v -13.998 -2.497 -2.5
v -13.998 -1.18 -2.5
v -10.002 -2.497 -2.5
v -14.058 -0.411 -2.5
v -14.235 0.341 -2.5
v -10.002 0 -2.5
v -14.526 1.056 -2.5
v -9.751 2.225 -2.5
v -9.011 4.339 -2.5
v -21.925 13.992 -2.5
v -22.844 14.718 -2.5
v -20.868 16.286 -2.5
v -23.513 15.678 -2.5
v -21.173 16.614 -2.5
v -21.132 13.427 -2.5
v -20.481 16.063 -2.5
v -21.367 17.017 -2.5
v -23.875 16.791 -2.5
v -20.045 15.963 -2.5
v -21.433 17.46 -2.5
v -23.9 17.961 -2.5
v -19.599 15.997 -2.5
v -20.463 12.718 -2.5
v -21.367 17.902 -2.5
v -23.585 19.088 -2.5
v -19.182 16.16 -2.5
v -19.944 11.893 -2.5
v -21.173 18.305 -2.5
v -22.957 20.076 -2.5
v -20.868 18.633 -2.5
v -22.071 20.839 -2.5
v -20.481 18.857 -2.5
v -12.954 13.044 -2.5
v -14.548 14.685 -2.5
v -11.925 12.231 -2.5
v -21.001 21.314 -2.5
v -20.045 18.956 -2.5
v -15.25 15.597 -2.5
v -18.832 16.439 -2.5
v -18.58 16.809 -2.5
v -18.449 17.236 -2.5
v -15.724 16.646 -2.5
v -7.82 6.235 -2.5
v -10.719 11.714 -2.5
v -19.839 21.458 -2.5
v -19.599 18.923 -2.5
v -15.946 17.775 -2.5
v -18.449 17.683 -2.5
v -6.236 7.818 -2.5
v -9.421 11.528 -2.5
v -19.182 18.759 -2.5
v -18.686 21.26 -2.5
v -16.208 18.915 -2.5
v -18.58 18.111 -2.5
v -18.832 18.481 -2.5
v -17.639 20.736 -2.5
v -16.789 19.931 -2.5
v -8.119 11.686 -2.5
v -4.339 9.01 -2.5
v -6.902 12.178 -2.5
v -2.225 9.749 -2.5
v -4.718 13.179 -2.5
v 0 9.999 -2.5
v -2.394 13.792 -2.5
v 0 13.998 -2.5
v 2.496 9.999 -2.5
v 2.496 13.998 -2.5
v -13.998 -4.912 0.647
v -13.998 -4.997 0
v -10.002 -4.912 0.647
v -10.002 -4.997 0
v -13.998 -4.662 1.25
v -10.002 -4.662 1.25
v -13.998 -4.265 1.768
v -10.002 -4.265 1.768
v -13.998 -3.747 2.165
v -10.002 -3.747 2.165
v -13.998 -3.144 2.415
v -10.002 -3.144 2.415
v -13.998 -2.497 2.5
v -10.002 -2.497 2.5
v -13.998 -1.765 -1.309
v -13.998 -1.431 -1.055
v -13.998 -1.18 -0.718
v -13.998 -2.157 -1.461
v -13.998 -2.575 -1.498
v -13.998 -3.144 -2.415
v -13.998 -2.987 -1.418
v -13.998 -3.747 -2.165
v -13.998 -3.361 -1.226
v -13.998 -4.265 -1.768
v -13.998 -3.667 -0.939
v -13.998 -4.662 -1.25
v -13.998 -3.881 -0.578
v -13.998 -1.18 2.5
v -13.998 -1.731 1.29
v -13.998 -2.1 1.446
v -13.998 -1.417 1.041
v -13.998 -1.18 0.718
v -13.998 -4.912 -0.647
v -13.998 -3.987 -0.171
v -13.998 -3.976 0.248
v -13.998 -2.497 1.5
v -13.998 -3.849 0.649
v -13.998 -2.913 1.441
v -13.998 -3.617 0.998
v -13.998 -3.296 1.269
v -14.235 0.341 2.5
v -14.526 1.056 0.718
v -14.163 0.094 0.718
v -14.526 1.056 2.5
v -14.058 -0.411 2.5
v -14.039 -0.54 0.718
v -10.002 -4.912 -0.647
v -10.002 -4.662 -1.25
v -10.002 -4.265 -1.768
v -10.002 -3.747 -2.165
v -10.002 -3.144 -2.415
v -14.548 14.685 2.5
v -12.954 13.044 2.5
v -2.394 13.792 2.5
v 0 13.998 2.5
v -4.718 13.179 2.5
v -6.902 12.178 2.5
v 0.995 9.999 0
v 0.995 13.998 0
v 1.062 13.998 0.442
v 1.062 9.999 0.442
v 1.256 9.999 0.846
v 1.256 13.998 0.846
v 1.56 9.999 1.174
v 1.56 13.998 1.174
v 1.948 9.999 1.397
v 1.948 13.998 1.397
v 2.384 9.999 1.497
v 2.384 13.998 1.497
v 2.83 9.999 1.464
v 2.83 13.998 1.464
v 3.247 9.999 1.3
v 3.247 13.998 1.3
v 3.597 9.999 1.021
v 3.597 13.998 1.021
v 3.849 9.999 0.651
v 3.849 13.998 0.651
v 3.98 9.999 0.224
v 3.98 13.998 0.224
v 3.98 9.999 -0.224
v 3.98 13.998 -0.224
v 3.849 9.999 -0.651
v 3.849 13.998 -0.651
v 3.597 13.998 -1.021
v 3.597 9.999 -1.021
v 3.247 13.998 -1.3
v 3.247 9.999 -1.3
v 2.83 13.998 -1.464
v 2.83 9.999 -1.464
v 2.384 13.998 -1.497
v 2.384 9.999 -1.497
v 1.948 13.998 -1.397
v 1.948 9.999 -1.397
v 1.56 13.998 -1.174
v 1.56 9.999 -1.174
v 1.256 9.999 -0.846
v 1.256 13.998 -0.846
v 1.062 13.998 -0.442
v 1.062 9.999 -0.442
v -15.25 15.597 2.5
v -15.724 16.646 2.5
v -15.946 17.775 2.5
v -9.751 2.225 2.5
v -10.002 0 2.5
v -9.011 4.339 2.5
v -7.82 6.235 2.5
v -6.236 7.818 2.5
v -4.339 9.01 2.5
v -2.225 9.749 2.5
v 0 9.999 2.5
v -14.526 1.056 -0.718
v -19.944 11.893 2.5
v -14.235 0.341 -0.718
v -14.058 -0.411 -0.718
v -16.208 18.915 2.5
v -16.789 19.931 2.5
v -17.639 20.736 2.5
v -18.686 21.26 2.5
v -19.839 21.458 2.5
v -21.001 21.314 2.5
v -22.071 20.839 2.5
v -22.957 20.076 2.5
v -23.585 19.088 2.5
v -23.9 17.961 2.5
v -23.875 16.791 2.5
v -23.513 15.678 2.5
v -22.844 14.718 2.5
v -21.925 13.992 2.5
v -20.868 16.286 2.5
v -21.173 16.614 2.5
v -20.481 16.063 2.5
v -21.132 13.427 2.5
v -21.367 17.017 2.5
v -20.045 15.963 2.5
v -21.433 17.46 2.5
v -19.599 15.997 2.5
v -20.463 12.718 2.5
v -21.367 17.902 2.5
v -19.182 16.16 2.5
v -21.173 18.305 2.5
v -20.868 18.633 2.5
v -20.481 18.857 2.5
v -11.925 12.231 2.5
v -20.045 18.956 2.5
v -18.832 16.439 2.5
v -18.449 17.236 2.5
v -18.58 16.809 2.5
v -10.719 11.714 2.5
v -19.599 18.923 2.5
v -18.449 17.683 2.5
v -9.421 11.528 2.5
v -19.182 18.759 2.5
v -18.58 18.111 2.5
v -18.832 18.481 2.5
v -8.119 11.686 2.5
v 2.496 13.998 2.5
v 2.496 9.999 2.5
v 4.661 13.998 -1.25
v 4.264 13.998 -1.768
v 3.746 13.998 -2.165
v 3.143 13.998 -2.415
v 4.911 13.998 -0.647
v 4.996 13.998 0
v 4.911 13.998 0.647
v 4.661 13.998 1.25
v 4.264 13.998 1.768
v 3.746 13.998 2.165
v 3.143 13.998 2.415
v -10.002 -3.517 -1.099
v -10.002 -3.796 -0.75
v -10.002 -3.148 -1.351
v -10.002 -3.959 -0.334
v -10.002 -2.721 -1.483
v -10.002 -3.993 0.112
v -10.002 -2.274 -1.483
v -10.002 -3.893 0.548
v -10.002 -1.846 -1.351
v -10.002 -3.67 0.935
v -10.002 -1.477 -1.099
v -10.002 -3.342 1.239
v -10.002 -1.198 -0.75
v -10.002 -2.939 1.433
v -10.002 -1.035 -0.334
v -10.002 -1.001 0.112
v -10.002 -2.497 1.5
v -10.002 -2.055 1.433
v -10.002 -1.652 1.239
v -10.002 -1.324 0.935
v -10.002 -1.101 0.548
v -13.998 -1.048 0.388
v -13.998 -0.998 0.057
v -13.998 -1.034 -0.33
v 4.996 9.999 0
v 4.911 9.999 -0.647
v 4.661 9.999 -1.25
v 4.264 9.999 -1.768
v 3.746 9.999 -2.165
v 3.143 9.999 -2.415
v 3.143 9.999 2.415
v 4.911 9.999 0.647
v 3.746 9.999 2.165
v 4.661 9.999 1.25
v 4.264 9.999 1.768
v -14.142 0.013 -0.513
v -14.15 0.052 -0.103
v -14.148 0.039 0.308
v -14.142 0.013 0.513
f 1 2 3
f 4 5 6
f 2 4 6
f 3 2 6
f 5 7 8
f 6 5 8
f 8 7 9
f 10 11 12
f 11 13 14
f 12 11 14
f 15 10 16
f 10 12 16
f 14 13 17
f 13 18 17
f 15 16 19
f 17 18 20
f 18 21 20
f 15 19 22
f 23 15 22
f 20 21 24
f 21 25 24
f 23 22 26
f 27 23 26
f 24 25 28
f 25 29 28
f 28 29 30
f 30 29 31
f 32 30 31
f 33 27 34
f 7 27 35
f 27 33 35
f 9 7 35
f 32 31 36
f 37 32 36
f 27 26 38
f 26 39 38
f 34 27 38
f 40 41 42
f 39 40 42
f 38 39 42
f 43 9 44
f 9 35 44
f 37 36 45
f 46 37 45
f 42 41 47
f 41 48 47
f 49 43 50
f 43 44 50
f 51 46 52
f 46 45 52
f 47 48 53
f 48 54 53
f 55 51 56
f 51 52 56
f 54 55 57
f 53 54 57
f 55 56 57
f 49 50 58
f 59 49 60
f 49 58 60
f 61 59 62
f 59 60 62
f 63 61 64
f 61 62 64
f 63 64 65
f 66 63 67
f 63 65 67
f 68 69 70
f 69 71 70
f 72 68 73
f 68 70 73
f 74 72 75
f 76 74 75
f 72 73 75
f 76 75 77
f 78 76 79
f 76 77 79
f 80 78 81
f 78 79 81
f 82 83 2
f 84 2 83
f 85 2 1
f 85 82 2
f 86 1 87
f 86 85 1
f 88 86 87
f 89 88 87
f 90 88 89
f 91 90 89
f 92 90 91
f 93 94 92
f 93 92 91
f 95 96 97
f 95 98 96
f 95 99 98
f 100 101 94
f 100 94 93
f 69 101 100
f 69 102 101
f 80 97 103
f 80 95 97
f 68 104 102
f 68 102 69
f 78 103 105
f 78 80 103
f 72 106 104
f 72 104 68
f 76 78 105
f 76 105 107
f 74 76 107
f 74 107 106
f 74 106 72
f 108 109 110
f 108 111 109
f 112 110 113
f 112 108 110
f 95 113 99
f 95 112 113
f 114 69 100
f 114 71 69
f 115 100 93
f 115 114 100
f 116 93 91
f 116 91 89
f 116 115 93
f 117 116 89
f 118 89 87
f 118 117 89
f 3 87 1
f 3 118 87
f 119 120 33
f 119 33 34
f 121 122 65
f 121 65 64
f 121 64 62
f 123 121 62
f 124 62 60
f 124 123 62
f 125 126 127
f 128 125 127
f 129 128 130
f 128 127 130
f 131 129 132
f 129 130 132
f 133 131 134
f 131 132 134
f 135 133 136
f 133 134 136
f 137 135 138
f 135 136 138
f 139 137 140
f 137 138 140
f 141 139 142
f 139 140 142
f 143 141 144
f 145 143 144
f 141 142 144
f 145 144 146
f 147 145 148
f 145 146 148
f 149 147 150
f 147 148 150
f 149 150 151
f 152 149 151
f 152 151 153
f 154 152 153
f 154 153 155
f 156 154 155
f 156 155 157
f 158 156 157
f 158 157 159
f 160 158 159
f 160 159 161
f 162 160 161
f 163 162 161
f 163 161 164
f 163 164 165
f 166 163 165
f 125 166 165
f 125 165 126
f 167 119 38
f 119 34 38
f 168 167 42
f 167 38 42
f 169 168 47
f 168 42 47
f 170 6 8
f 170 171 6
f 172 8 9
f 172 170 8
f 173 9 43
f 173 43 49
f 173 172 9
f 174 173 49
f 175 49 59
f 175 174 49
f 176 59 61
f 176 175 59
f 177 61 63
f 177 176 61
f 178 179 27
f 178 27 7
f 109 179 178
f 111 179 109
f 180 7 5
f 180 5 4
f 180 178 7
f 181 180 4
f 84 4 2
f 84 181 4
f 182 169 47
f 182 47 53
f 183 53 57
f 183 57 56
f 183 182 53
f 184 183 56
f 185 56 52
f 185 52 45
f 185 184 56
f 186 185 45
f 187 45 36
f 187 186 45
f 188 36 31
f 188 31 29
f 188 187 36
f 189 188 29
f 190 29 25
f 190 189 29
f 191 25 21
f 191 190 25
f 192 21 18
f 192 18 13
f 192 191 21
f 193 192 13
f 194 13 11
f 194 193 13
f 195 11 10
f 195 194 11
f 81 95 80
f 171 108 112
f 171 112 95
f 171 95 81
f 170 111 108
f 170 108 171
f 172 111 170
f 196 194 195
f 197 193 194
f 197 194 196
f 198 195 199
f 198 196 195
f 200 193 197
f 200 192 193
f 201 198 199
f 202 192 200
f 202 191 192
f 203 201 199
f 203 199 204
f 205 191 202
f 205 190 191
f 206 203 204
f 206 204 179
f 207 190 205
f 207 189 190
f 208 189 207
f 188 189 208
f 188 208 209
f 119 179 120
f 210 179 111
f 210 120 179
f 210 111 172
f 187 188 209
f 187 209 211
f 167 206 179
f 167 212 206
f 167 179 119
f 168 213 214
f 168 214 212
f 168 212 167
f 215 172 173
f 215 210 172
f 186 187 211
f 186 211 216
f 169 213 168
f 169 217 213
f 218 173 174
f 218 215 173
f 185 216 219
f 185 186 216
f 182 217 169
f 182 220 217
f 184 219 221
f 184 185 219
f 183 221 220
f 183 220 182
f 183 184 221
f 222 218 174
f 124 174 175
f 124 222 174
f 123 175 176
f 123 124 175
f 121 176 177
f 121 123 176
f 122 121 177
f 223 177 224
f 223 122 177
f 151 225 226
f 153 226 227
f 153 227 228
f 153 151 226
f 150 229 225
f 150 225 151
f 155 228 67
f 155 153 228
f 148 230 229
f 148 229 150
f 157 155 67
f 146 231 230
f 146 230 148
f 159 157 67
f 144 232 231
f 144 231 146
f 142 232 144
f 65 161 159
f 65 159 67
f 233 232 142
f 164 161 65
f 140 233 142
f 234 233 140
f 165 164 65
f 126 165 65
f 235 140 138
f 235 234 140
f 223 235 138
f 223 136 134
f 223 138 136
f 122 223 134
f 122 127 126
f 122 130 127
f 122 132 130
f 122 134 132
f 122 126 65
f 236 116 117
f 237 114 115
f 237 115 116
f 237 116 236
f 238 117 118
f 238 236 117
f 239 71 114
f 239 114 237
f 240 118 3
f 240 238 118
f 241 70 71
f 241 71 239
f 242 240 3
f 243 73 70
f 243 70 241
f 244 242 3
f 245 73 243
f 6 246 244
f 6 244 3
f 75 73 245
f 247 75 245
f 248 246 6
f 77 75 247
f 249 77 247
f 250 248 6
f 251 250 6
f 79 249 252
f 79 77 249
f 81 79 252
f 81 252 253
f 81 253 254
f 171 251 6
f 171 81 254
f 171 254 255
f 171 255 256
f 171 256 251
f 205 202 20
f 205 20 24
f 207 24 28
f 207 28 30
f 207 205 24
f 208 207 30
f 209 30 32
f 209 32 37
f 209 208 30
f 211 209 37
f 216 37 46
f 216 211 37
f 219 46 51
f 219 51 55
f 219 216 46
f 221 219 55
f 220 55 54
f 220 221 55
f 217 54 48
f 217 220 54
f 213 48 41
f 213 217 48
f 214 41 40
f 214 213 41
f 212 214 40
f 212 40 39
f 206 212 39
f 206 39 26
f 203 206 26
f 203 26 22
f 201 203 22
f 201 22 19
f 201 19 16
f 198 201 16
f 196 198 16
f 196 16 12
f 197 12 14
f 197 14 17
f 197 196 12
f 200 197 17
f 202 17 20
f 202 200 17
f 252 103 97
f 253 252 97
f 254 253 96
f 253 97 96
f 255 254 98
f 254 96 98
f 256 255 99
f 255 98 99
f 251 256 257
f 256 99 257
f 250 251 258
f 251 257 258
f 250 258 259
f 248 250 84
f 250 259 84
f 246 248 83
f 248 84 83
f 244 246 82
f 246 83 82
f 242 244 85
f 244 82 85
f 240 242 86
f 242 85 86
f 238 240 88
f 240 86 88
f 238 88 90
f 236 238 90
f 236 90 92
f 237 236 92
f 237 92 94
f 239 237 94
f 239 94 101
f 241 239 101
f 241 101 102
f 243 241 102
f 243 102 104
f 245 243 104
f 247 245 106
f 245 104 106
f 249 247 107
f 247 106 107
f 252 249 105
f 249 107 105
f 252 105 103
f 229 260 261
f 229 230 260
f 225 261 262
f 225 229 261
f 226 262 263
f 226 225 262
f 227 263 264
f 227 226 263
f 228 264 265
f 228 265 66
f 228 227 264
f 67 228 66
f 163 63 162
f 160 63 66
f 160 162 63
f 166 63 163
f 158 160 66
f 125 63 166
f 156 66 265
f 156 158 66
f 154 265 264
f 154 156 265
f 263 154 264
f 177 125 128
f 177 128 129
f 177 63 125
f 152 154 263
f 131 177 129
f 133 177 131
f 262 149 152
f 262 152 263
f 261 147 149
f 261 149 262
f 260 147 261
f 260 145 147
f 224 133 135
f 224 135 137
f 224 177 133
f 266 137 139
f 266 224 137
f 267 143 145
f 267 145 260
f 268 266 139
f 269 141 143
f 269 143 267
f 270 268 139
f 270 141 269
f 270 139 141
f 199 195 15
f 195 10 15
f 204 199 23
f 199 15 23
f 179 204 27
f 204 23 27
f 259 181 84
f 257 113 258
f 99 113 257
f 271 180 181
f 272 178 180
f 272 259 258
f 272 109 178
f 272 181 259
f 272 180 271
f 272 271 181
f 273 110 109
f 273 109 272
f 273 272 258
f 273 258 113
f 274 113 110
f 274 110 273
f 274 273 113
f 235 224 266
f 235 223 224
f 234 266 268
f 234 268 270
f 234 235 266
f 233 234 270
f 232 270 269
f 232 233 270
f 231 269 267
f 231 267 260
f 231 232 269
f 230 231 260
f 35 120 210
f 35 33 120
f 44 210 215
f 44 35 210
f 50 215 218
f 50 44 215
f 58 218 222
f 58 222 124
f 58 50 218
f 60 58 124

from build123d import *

# Parameters (mm, degrees)
EXTRUDE_1_DEPTH     = 2.5
FILLET_1_R          = 2.5
SKETCH_4_R          = 1.501202813
CUT_EXTRUDE_2_DEPTH = 5
SKETCH_5_R          = 1.499820195
CUT_EXTRUDE_3_DEPTH = 5
EXTRUDE_START       = -5
SKETCH_6_R          = 1.500762706
EXTRUDE_2_DEPTH     = 5
FILLET_2_R          = 5


with BuildPart() as part:
    # 草图1 → 凸台-拉伸1 (new, symmetric)
    with BuildSketch(Plane.XY):
        with BuildLine():
            Line((0, 9.998744027), (4.99606171, 9.998744027))
            Line((4.99606171, 9.998744027), (4.99606171, 13.997916296))
            Line((4.99606171, 13.997916296), (0, 13.997916296))
            ThreePointArc((0, 13.997916296), (-9.898021536, 9.898021536), (-13.997916296, 0))
            Line((-13.997916296, 0), (-13.997916296, -4.997048222))
            Line((-13.997916296, -4.997048222), (-10.001933758, -4.997048222))
            Line((-10.001933758, -4.997048222), (-10.001933758, 0))
            ThreePointArc((-10.001933758, 0), (-7.072241637, 7.071307535), (0, 9.998744027))
        make_face()
    extrude(amount=EXTRUDE_1_DEPTH, both=True)

    # 圆角1
    fillet_1_edges = [part.edges().sort_by_distance(p)[0] for p in [
        (-11.999925027, -4.997048222, -2.5),
        (-11.999925027, -4.997048222, 2.5),
        (4.99606171, 11.998330162, -2.5),
        (4.99606171, 11.998330162, 2.5),
    ]]
    fillet(fillet_1_edges, radius=FILLET_1_R - 0.0001)  # a hair under: the kernel refuses the full size

    # 草图4 → 切除-拉伸2 (cut)
    with BuildSketch(Plane(origin=(0, 13.997916296, 0), x_dir=(1, 0, 0), z_dir=(0, 1, 0))):
        with Locations(Location((2.49606171, 0, 0), (0, 0, 180))):
            Circle(SKETCH_4_R)
    extrude(amount=-CUT_EXTRUDE_2_DEPTH, mode=Mode.SUBTRACT)

    # 草图5 → 切除-拉伸3 (cut)
    with BuildSketch(Plane.ZY.offset(13.997916296)):
        with Locations((0, -2.497048222)):
            Circle(SKETCH_5_R)
    extrude(amount=-CUT_EXTRUDE_3_DEPTH, mode=Mode.SUBTRACT)

    # 草图6 → 凸台-拉伸2 (add)
    with BuildSketch(Plane(origin=(0, 0, -2.5), x_dir=(-1, 0, 0), z_dir=(0, 0, -1)).offset(EXTRUDE_START)):
        with BuildLine():
            Line((9.898430706, 9.897612349), (16.10800673, 16.291078939))
            ThreePointArc((16.10800673, 16.291078939), (21.958821842, 20.907611506), (20.772449798, 13.549831148))
            Line((20.772449798, 13.549831148), (13.997916296, 0))
            ThreePointArc((13.997916296, 0), (12.932499084, 5.356503344), (9.898430706, 9.897612349))
        make_face()
        with Locations((19.932570399, 17.459789485)):
            Circle(SKETCH_6_R, mode=Mode.SUBTRACT)
    extrude(amount=EXTRUDE_2_DEPTH)

    # 圆角2
    fillet_2_edges = [part.edges().sort_by_distance(p)[0] for p in [
        (-13.997916296, 0, 0),
        (-9.898430706, 9.897612349, 0),
        (-16.10800673, 16.291078939, 0),
        (-20.772449798, 13.549831148, 0),
    ]]
    fillet(fillet_2_edges, radius=FILLET_2_R)


solid = part.part
